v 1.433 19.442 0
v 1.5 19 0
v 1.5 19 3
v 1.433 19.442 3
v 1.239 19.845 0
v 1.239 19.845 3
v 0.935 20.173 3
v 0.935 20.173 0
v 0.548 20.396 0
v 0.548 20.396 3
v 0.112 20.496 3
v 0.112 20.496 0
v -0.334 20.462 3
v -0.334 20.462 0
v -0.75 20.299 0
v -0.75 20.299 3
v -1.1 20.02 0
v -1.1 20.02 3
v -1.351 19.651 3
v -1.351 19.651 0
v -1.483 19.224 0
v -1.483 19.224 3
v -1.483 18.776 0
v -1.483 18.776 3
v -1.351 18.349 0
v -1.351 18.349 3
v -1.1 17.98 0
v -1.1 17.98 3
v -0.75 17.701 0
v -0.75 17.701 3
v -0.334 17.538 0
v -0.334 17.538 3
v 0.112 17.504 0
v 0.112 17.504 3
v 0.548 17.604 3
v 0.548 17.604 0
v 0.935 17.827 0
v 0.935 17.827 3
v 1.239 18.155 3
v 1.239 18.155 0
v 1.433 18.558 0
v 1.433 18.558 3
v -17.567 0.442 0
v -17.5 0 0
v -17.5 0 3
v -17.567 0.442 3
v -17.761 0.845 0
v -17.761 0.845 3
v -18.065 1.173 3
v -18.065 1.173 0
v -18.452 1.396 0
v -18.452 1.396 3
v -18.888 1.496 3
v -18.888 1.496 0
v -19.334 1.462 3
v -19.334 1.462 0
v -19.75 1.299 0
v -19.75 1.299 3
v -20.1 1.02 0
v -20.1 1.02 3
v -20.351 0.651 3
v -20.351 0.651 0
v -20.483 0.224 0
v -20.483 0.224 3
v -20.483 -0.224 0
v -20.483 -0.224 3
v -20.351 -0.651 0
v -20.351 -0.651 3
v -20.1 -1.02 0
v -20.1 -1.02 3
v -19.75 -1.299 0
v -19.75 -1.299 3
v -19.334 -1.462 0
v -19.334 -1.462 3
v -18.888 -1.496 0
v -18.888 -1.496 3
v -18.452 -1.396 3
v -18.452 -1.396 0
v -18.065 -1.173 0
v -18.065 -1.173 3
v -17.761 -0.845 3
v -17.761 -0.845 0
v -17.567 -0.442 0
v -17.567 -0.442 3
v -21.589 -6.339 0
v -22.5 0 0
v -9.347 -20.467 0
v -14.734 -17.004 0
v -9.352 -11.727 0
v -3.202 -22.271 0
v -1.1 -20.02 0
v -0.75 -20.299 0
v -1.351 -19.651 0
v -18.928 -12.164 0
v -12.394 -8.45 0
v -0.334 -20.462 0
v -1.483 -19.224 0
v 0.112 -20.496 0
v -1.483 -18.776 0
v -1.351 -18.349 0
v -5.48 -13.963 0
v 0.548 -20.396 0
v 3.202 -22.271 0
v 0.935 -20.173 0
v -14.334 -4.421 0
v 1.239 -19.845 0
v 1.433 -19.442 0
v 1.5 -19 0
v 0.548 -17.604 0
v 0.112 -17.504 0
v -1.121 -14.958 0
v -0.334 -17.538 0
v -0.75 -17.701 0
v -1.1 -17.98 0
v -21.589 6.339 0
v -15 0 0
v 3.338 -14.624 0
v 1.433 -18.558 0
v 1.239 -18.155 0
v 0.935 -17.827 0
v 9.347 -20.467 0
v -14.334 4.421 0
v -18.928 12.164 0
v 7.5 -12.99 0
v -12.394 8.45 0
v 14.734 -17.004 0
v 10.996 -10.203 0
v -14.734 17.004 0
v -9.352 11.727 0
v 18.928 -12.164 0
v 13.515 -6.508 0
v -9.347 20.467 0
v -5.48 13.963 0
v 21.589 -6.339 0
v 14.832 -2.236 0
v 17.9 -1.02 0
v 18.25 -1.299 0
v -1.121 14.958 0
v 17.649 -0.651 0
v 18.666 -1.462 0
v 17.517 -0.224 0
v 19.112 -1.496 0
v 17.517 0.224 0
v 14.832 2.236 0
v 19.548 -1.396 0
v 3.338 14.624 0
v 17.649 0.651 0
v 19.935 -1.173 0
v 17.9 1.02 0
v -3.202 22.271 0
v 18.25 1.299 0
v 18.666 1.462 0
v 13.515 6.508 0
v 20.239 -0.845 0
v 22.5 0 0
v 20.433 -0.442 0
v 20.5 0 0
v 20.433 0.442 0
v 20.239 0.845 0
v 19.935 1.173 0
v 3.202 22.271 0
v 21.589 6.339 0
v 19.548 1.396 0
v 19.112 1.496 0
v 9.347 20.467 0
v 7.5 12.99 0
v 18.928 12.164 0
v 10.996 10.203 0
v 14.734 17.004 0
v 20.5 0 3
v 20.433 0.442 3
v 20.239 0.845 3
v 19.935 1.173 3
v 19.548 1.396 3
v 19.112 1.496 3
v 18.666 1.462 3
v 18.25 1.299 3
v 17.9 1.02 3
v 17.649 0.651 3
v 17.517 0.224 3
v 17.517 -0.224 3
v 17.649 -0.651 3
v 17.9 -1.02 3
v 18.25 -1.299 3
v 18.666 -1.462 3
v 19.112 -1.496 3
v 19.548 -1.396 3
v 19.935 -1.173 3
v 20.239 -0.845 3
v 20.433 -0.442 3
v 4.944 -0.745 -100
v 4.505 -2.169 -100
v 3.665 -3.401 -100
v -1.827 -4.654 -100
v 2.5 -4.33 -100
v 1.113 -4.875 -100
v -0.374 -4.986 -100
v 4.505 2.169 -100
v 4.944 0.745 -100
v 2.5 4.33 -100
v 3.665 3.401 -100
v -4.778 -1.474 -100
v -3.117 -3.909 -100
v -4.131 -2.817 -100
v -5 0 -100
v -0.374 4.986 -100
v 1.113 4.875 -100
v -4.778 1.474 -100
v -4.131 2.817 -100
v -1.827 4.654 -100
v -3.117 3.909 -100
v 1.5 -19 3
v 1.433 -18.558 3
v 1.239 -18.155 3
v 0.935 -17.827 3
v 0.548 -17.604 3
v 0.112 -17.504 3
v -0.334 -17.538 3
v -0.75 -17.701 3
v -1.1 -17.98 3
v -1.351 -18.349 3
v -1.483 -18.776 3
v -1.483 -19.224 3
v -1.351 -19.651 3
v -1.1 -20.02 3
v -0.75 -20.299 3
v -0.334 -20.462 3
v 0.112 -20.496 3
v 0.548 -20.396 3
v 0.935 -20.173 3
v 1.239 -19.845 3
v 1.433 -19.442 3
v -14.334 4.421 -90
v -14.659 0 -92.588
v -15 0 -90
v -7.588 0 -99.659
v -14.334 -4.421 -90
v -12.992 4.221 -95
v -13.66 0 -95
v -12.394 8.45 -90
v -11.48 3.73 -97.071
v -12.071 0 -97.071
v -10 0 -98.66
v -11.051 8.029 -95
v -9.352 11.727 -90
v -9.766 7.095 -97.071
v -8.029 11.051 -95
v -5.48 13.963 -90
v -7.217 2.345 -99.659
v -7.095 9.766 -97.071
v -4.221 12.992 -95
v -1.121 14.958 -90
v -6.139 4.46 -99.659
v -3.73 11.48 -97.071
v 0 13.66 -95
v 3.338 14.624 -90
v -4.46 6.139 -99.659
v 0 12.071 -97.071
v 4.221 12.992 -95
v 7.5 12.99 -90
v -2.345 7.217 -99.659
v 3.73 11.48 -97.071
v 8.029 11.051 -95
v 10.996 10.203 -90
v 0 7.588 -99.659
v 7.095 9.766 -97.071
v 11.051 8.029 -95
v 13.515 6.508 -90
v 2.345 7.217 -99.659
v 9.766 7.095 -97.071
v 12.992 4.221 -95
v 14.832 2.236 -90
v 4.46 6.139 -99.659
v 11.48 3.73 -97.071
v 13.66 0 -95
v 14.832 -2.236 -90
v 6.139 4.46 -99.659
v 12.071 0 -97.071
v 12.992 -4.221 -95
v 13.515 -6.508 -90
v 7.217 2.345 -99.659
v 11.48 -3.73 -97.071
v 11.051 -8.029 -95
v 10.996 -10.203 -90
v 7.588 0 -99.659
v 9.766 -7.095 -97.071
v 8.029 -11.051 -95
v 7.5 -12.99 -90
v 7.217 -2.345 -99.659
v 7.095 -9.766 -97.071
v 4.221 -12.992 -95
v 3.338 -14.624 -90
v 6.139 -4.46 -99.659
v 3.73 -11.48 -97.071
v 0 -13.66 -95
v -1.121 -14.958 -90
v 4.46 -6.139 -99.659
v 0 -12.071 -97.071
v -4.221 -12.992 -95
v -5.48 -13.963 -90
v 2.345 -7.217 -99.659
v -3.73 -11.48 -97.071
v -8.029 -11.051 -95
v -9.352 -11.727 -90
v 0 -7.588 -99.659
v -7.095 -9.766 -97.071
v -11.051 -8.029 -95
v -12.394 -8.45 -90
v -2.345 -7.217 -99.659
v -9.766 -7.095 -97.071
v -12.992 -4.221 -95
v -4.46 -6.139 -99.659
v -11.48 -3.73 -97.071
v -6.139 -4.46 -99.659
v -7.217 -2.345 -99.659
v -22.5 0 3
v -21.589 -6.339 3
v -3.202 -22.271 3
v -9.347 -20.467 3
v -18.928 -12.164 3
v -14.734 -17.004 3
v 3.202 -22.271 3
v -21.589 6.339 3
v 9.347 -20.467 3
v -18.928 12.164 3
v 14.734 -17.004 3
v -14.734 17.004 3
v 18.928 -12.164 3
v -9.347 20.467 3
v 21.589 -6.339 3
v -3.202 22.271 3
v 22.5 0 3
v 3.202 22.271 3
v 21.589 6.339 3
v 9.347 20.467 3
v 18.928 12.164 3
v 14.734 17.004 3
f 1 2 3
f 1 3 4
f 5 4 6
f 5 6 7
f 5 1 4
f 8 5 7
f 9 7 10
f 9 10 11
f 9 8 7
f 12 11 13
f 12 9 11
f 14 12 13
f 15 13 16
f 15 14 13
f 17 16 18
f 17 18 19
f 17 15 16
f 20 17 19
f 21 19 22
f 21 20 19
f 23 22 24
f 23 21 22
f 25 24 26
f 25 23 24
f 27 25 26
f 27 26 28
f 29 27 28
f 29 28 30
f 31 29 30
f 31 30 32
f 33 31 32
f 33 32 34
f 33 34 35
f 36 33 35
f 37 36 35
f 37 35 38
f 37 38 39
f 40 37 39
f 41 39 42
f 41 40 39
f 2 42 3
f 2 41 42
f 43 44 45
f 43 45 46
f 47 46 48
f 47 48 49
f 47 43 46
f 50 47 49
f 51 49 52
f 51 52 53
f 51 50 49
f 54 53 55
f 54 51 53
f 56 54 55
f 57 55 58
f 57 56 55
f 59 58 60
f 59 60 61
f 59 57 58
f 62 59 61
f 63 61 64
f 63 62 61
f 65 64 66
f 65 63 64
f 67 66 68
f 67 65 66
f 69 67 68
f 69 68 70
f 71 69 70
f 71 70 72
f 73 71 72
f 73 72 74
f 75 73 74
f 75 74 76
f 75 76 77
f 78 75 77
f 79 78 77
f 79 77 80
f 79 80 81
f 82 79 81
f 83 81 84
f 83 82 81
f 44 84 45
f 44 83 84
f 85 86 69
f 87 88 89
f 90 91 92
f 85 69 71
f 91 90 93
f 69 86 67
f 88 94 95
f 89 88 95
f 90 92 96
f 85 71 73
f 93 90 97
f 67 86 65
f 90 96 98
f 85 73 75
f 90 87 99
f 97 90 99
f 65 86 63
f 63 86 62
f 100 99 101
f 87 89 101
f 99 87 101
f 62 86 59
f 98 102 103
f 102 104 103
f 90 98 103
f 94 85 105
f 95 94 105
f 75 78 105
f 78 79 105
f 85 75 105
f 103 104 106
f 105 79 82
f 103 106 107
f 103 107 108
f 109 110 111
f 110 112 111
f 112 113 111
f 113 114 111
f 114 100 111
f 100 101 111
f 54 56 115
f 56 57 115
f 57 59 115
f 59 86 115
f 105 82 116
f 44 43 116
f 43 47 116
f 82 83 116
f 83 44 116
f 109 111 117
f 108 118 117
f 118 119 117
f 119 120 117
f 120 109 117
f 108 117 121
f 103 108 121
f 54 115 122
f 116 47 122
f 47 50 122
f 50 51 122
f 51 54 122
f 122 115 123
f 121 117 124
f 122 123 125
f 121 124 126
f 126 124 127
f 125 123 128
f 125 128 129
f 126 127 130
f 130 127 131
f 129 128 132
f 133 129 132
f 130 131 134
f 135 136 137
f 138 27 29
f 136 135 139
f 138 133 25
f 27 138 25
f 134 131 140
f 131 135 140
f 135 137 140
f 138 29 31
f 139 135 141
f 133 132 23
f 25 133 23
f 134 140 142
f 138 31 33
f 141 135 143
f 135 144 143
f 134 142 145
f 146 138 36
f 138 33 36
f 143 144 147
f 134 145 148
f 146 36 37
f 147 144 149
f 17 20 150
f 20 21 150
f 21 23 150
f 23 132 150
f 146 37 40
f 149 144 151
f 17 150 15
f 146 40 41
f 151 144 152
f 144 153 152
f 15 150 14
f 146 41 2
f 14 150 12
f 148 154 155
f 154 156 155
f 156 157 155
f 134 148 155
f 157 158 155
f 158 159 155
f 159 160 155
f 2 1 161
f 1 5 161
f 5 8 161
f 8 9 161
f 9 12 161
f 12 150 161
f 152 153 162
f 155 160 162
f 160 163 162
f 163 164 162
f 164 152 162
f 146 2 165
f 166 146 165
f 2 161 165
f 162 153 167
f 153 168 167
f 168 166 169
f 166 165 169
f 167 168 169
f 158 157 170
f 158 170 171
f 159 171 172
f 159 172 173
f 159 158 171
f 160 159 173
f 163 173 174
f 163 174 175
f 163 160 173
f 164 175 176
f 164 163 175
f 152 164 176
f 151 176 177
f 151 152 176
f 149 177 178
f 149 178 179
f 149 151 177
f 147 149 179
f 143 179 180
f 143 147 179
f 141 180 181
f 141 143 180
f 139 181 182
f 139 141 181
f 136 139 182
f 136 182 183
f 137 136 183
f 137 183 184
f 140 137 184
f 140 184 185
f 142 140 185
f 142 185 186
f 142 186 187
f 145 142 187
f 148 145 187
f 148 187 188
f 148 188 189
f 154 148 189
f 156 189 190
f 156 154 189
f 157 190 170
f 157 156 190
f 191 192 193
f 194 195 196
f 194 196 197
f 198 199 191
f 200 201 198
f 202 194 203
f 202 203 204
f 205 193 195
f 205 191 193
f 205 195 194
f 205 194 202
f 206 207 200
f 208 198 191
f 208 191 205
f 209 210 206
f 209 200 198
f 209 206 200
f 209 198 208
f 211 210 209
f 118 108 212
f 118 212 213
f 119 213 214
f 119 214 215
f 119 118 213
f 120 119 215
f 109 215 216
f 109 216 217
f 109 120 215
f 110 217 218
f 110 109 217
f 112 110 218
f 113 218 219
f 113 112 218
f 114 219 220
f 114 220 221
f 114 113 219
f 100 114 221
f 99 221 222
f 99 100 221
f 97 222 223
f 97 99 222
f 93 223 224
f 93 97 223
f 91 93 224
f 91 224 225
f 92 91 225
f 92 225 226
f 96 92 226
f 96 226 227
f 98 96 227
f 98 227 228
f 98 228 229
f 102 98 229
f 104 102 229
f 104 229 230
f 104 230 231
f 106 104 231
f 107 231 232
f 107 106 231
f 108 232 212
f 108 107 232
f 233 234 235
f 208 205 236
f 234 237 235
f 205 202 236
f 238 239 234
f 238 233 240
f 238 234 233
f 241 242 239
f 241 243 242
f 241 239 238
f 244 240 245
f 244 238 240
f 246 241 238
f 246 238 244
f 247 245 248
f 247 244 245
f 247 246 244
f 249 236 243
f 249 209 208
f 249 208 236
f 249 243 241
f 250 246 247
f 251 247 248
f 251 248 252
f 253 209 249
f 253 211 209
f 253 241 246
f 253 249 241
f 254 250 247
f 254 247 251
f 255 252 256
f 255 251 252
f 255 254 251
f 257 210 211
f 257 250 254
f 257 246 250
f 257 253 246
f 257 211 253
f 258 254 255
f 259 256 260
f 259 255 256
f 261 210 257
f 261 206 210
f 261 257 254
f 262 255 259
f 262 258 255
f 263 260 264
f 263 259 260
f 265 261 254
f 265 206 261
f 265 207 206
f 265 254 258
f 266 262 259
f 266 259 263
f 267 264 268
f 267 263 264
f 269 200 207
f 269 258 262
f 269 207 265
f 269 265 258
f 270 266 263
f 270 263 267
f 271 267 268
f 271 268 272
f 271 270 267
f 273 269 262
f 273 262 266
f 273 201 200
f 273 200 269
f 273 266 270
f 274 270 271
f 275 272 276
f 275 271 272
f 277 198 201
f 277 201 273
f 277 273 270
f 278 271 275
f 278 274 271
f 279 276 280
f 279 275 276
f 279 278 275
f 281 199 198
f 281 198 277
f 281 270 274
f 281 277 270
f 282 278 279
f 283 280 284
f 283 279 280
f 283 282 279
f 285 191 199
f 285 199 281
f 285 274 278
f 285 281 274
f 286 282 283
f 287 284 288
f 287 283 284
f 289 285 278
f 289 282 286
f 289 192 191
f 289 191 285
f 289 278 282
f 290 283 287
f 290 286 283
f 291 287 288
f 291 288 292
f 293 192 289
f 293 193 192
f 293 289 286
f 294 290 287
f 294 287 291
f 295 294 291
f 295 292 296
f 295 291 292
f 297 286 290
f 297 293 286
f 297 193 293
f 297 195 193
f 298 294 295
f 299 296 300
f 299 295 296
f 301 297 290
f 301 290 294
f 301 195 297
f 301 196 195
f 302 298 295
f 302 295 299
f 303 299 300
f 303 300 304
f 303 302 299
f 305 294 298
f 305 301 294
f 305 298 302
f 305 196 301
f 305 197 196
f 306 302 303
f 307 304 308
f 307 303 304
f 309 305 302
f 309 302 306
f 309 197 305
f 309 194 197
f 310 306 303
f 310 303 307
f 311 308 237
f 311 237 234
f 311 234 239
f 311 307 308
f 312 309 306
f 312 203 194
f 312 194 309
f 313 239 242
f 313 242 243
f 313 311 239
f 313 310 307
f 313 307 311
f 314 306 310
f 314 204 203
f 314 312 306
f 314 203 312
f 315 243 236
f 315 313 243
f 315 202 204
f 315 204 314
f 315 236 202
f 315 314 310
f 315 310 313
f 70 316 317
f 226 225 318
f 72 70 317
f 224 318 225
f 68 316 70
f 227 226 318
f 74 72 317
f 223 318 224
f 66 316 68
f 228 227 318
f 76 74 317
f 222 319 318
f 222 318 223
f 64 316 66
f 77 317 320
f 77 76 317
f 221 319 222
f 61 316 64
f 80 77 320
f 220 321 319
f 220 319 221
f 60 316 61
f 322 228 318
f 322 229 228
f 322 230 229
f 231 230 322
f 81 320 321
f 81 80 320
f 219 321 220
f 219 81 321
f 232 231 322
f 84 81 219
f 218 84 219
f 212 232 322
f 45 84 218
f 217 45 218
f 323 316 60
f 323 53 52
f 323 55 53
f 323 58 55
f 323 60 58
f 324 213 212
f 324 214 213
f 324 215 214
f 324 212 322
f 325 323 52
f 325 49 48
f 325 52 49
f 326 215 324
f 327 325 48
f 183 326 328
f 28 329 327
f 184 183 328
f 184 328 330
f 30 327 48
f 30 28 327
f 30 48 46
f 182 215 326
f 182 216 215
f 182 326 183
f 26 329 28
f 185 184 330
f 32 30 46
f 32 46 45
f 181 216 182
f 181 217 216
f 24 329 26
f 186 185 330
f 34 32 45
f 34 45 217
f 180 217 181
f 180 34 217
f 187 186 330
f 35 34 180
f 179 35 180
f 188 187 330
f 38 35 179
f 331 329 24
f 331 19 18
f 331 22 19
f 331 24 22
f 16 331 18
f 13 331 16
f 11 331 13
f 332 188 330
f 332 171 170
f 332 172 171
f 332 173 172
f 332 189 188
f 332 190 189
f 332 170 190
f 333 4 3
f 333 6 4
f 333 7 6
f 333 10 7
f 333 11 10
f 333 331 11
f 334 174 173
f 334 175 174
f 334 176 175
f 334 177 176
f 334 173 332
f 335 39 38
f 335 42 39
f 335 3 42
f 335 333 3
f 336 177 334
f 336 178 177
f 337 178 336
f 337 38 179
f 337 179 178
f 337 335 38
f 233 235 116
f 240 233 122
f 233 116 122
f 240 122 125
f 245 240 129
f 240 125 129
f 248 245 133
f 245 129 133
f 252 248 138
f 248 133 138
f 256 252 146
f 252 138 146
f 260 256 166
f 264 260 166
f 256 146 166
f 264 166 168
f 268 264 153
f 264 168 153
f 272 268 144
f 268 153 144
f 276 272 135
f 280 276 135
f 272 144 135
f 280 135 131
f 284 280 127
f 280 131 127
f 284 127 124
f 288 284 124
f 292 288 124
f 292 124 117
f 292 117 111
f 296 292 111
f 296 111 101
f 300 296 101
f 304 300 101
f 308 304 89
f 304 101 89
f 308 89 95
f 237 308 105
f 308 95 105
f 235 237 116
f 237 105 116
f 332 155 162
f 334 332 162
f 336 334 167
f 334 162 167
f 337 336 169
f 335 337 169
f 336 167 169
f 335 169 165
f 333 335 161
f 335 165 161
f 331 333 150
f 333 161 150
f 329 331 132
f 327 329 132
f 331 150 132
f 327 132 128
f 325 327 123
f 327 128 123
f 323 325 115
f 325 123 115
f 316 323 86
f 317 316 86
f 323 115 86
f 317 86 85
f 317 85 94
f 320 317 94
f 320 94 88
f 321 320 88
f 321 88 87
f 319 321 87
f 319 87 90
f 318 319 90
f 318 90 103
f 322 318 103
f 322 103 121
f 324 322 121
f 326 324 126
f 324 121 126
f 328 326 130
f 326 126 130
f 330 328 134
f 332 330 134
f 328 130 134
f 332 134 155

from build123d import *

# Parameters (mm, degrees)
ESQUISSE1_R        = 22.5
ESQUISSE1_R_2      = 1.5
BOSS_EXTRU_1_DEPTH = 3
ESQUISSE2_R        = 15
BOSS_EXTRU_2_DEPTH = 100
CONG_1_R           = 10


with BuildPart() as part:
    # Esquisse1 → Boss.-Extru.1 (new body)
    with BuildSketch(Plane.XY):
        Circle(ESQUISSE1_R)
        with Locations((0, 19)):
            Circle(ESQUISSE1_R_2, mode=Mode.SUBTRACT)
        with Locations((19, 0)):
            Circle(ESQUISSE1_R_2, mode=Mode.SUBTRACT)
        with Locations((0, -19)):
            Circle(ESQUISSE1_R_2, mode=Mode.SUBTRACT)
        with Locations((-19, 0)):
            Circle(ESQUISSE1_R_2, mode=Mode.SUBTRACT)
    extrude(amount=BOSS_EXTRU_1_DEPTH)

    # Esquisse2 → Boss.-Extru.2 (add)
    with BuildSketch(Plane(origin=(0, 0, 0), x_dir=(-1, 0, 0), z_dir=(0, 0, -1))):
        Circle(ESQUISSE2_R)
    extrude(amount=BOSS_EXTRU_2_DEPTH)

    # Congé1
    cong_1_edges = [part.edges().sort_by_distance(p)[0] for p in [
        (15, 0, -100),
    ]]
    fillet(cong_1_edges, radius=CONG_1_R)


solid = part.part
